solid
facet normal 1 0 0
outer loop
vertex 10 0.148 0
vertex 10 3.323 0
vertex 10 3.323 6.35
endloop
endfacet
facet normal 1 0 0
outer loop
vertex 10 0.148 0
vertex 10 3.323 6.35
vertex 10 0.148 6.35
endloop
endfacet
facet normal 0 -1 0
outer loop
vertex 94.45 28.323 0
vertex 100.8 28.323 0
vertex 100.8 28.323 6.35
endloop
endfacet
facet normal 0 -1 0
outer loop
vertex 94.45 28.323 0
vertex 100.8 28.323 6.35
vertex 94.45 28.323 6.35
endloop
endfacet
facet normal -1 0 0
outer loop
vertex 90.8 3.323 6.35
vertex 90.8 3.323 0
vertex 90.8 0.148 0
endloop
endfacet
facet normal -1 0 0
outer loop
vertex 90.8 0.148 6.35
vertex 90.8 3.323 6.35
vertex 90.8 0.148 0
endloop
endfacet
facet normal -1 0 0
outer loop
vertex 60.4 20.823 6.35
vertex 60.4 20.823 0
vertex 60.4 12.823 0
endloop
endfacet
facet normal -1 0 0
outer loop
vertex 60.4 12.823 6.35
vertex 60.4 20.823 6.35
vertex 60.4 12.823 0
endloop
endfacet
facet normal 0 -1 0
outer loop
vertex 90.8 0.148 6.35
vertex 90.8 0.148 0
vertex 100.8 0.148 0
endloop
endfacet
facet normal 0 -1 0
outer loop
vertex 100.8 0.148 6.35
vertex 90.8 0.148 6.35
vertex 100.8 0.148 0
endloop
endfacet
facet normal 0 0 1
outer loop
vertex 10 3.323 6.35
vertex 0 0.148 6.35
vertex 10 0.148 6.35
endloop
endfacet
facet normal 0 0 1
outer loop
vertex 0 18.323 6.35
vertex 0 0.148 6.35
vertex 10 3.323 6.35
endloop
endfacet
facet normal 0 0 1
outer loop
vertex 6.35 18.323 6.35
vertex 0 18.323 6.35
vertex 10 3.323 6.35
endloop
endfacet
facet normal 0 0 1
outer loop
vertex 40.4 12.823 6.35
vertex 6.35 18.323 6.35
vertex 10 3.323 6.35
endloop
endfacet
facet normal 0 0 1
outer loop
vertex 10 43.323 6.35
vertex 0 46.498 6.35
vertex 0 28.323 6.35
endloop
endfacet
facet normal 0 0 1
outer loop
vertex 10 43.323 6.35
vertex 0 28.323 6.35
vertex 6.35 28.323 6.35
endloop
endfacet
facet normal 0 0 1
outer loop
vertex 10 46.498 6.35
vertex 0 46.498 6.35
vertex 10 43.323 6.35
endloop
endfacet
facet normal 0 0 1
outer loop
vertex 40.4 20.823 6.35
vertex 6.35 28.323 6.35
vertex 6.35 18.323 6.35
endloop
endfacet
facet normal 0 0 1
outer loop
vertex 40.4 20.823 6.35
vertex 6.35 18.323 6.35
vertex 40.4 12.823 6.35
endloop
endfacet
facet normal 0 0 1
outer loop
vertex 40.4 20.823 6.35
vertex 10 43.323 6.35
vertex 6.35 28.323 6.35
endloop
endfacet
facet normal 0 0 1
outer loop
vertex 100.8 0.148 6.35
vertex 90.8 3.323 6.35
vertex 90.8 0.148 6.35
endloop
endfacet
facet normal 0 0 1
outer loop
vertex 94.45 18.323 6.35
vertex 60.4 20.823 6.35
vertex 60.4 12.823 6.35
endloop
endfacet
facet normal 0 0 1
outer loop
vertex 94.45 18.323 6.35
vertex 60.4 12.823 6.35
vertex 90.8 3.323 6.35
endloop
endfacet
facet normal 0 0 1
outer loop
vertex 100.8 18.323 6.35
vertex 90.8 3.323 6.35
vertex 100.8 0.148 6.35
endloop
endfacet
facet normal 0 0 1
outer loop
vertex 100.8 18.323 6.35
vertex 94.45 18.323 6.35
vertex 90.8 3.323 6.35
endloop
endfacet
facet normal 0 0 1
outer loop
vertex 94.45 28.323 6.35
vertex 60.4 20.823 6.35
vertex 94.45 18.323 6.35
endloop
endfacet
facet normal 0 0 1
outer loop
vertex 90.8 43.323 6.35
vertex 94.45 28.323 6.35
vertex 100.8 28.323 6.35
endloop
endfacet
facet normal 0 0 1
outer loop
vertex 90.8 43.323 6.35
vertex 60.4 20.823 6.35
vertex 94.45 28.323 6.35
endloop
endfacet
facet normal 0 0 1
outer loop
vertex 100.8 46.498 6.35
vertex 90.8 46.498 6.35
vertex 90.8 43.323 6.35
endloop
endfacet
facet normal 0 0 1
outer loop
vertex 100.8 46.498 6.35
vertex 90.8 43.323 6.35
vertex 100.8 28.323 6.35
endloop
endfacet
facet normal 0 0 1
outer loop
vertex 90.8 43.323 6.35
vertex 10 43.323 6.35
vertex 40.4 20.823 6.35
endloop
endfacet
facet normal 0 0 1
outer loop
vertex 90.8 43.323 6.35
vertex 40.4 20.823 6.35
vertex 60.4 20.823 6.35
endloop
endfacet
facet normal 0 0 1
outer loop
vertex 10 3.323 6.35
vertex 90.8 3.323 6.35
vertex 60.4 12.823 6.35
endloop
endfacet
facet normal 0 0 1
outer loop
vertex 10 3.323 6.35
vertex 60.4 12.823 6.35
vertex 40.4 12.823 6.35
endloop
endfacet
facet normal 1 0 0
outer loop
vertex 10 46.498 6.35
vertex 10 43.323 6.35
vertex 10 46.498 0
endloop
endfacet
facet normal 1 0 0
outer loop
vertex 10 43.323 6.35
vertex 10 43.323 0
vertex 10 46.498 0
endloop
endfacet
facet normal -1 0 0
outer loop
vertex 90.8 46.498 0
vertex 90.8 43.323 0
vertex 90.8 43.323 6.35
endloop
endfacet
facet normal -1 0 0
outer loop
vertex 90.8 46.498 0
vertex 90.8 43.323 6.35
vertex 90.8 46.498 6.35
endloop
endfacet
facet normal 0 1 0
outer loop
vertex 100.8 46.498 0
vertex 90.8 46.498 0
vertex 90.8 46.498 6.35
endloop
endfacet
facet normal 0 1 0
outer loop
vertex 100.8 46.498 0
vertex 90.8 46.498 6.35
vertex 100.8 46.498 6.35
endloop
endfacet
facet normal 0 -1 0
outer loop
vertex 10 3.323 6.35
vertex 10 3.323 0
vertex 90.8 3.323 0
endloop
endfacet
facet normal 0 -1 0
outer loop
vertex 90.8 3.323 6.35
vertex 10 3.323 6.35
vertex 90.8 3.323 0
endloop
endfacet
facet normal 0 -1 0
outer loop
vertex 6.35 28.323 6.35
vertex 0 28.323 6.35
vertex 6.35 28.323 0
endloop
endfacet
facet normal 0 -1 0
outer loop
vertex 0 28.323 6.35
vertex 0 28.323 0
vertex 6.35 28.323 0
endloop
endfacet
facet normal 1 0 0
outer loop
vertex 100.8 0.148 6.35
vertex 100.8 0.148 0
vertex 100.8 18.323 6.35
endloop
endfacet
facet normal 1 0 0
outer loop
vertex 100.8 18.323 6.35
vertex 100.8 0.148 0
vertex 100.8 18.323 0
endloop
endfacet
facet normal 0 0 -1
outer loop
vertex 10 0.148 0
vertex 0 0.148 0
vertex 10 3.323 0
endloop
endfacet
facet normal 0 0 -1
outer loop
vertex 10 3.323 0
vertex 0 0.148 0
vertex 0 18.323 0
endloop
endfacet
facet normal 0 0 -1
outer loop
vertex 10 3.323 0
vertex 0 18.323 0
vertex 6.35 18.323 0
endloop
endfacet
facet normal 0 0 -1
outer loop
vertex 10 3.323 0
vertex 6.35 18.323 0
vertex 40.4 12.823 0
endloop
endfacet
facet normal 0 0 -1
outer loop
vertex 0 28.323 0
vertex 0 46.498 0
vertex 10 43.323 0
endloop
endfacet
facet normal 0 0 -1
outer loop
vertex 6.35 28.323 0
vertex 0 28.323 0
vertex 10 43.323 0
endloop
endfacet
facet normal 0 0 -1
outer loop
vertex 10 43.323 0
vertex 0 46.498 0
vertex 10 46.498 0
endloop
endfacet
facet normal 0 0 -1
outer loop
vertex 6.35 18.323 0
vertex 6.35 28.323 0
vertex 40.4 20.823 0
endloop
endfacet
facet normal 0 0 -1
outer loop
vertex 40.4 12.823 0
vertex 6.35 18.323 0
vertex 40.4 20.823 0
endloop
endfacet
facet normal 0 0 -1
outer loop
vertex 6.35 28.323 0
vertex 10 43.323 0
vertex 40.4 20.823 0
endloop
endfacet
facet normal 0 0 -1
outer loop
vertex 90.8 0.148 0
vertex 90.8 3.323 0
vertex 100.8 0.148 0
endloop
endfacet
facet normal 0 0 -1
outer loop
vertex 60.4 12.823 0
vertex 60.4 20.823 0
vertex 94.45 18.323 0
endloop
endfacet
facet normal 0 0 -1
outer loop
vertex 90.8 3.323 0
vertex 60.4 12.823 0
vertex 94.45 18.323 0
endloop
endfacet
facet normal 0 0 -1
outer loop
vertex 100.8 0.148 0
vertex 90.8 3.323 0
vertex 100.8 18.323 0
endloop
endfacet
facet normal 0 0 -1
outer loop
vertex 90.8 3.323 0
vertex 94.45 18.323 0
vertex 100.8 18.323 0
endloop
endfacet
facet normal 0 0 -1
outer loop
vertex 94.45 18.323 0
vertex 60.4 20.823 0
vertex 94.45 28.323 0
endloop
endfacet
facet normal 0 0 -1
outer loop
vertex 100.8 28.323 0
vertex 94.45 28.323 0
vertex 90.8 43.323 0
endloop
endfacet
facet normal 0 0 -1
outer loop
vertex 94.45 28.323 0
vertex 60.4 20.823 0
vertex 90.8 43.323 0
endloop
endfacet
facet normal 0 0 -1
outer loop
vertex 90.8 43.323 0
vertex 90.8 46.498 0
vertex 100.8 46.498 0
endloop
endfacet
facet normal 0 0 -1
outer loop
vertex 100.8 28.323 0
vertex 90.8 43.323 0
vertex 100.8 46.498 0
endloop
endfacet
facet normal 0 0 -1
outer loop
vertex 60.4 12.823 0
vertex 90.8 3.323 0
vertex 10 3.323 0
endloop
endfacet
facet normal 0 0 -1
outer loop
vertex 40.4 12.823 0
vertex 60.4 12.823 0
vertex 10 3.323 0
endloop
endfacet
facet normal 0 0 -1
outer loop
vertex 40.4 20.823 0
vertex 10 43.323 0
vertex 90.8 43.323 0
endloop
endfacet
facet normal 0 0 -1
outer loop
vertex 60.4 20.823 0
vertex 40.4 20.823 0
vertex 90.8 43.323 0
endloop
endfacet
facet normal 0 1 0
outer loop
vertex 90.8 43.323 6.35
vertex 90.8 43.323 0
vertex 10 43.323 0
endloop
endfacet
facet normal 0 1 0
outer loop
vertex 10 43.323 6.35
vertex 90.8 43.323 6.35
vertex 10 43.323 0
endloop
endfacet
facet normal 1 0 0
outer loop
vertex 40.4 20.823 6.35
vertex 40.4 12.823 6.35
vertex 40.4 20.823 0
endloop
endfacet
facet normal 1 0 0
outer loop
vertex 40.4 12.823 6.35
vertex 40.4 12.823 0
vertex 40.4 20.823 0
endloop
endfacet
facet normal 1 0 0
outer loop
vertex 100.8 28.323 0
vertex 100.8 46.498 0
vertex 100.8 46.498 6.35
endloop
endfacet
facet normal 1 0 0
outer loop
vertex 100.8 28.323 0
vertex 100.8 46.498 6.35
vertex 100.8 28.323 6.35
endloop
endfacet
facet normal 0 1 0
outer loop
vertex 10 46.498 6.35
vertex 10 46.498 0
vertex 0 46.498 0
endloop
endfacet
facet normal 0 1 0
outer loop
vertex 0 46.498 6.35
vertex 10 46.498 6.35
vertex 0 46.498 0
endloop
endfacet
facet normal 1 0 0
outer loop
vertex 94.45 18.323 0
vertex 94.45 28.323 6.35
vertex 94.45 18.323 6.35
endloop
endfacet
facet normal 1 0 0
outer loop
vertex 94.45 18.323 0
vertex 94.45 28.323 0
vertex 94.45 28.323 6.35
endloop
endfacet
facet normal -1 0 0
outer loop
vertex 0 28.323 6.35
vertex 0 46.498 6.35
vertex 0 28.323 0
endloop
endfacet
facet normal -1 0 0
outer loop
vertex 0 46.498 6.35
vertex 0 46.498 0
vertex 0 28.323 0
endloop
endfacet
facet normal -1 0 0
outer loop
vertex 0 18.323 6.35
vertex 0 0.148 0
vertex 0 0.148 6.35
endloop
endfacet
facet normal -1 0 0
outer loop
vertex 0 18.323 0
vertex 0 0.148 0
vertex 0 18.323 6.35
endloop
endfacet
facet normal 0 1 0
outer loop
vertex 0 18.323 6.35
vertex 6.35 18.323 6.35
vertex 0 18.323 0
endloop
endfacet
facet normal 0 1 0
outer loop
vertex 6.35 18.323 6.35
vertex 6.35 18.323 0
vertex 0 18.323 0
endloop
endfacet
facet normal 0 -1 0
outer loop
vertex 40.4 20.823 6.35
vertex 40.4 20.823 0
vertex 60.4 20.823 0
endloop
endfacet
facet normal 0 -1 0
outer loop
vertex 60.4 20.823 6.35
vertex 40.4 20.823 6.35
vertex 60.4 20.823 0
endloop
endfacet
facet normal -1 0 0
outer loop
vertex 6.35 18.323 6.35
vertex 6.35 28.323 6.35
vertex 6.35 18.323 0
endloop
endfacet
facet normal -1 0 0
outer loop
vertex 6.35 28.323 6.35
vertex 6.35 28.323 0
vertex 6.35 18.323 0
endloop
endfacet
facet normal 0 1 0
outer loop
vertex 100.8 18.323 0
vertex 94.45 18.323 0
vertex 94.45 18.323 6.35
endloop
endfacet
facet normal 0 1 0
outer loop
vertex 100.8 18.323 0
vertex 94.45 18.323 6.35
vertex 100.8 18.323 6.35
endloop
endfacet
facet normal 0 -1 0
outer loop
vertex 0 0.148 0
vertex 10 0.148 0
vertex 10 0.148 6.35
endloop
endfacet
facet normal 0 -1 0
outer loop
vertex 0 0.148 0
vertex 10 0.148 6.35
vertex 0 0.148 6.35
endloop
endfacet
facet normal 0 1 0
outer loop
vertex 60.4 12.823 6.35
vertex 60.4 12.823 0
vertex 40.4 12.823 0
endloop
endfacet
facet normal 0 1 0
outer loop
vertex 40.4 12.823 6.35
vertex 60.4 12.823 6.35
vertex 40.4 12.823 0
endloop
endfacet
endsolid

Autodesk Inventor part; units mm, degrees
ref_plane "YZ Plane" through (0, 0, 0) normal (1, 0, 0) x (0, 1, 0)
ref_plane "XZ Plane" through (0, 0, 0) normal (0, 1, 0) x (-1, 0, 0)
ref_plane "XY Plane" through (0, 0, 0) normal (0, 0, 1) x (1, 0, 0)
sketch "Sketch1" plane through (0, 0, 0) normal (0, 0, 1) x (1, 0, 0)
  line L0 (90.8, 43.3229) -> (90.8, 46.4979)
  line L1 (90.8, 46.4979) -> (100.8, 46.4979)
  line L2 (100.8, 46.4979) -> (100.8, 43.175)
  line L3 (94.45, 28.3229) -> (94.45, 18.3229)
  line L4 (90.8, 0.1479) -> (100.8, 0.1479)
  line L5 (100.8, 0.1479) -> (100.8, 6.35)
  line L6 (100.8, 6.35) -> (100.8, 18.3229)
  line L7 (94.45, 18.3229) -> (100.8, 18.3229)
  line L8 (100.8, 28.3229) -> (94.45, 28.3229)
  line L9 (100.8, 28.3229) -> (100.8, 43.175)
  line L10 (90.8, 3.3229) -> (90.8, 0.1479)
  line L11 (10, 3.3229) -> (90.8, 3.3229)
  line L12 (90.8, 43.3229) -> (10, 43.3229)
  line L13 (10, 43.3229) -> (10, 46.4979)
  line L14 (10, 46.4979) -> (0, 46.4979)
  line L15 (0, 46.4979) -> (0, 43.175)
  line L16 (10, 3.3229) -> (10, 0.1479)
  line L17 (6.35, 28.3229) -> (6.35, 18.3229)
  line L18 (0, 43.175) -> (0, 28.3229)
  line L19 (0, 28.3229) -> (6.35, 28.3229)
  line L20 (0, 18.3229) -> (0, 6.35)
  line L21 (6.35, 18.3229) -> (0, 18.3229)
  line L22 (0, 0.1479) -> (0, 6.35)
  line L23 (10, 0.1479) -> (0, 0.1479)
  line L24 (40.4, 20.8229) -> (60.4, 20.8229)
  line L25 (60.4, 20.8229) -> (60.4, 12.8229)
  line L26 (60.4, 12.8229) -> (40.4, 12.8229)
  line L27 (40.4, 12.8229) -> (40.4, 20.8229)
  line L28 (50.4, 43.3229) -> (50.4, 3.3229)
  point P0 (0, 0)
  point P1 (4.5679, 28.3229)
  point P2 (50.4, 12.8229)
  point P3 (6.35, 23.3229)
  point P4 (50.4, 23.3229)
  point P5 (94.45, 23.3229)
  dimension "d0" = 40
  dimension "d1" = 20
  dimension "d2" = 8
  dimension "d3" = 88.1
  dimension "d4" = 80.8
  dimension "d5" = 3.175
  dimension "d6" = 3.175
  dimension "d7" = 3.175
  dimension "d8" = 3.175
  dimension "d9" = 10
  dimension "d10" = 10
  dimension "d11" = 9.5
extrude "Extrusion1" add sketch "Sketch1" along normal blind 6.35
extrude "Extrusion2" cut sketch "Sketch1" along normal blind 6.35 contours L28 L26 L27 L24 | L24 L25 L26 L28
properties part number "boxBack"
